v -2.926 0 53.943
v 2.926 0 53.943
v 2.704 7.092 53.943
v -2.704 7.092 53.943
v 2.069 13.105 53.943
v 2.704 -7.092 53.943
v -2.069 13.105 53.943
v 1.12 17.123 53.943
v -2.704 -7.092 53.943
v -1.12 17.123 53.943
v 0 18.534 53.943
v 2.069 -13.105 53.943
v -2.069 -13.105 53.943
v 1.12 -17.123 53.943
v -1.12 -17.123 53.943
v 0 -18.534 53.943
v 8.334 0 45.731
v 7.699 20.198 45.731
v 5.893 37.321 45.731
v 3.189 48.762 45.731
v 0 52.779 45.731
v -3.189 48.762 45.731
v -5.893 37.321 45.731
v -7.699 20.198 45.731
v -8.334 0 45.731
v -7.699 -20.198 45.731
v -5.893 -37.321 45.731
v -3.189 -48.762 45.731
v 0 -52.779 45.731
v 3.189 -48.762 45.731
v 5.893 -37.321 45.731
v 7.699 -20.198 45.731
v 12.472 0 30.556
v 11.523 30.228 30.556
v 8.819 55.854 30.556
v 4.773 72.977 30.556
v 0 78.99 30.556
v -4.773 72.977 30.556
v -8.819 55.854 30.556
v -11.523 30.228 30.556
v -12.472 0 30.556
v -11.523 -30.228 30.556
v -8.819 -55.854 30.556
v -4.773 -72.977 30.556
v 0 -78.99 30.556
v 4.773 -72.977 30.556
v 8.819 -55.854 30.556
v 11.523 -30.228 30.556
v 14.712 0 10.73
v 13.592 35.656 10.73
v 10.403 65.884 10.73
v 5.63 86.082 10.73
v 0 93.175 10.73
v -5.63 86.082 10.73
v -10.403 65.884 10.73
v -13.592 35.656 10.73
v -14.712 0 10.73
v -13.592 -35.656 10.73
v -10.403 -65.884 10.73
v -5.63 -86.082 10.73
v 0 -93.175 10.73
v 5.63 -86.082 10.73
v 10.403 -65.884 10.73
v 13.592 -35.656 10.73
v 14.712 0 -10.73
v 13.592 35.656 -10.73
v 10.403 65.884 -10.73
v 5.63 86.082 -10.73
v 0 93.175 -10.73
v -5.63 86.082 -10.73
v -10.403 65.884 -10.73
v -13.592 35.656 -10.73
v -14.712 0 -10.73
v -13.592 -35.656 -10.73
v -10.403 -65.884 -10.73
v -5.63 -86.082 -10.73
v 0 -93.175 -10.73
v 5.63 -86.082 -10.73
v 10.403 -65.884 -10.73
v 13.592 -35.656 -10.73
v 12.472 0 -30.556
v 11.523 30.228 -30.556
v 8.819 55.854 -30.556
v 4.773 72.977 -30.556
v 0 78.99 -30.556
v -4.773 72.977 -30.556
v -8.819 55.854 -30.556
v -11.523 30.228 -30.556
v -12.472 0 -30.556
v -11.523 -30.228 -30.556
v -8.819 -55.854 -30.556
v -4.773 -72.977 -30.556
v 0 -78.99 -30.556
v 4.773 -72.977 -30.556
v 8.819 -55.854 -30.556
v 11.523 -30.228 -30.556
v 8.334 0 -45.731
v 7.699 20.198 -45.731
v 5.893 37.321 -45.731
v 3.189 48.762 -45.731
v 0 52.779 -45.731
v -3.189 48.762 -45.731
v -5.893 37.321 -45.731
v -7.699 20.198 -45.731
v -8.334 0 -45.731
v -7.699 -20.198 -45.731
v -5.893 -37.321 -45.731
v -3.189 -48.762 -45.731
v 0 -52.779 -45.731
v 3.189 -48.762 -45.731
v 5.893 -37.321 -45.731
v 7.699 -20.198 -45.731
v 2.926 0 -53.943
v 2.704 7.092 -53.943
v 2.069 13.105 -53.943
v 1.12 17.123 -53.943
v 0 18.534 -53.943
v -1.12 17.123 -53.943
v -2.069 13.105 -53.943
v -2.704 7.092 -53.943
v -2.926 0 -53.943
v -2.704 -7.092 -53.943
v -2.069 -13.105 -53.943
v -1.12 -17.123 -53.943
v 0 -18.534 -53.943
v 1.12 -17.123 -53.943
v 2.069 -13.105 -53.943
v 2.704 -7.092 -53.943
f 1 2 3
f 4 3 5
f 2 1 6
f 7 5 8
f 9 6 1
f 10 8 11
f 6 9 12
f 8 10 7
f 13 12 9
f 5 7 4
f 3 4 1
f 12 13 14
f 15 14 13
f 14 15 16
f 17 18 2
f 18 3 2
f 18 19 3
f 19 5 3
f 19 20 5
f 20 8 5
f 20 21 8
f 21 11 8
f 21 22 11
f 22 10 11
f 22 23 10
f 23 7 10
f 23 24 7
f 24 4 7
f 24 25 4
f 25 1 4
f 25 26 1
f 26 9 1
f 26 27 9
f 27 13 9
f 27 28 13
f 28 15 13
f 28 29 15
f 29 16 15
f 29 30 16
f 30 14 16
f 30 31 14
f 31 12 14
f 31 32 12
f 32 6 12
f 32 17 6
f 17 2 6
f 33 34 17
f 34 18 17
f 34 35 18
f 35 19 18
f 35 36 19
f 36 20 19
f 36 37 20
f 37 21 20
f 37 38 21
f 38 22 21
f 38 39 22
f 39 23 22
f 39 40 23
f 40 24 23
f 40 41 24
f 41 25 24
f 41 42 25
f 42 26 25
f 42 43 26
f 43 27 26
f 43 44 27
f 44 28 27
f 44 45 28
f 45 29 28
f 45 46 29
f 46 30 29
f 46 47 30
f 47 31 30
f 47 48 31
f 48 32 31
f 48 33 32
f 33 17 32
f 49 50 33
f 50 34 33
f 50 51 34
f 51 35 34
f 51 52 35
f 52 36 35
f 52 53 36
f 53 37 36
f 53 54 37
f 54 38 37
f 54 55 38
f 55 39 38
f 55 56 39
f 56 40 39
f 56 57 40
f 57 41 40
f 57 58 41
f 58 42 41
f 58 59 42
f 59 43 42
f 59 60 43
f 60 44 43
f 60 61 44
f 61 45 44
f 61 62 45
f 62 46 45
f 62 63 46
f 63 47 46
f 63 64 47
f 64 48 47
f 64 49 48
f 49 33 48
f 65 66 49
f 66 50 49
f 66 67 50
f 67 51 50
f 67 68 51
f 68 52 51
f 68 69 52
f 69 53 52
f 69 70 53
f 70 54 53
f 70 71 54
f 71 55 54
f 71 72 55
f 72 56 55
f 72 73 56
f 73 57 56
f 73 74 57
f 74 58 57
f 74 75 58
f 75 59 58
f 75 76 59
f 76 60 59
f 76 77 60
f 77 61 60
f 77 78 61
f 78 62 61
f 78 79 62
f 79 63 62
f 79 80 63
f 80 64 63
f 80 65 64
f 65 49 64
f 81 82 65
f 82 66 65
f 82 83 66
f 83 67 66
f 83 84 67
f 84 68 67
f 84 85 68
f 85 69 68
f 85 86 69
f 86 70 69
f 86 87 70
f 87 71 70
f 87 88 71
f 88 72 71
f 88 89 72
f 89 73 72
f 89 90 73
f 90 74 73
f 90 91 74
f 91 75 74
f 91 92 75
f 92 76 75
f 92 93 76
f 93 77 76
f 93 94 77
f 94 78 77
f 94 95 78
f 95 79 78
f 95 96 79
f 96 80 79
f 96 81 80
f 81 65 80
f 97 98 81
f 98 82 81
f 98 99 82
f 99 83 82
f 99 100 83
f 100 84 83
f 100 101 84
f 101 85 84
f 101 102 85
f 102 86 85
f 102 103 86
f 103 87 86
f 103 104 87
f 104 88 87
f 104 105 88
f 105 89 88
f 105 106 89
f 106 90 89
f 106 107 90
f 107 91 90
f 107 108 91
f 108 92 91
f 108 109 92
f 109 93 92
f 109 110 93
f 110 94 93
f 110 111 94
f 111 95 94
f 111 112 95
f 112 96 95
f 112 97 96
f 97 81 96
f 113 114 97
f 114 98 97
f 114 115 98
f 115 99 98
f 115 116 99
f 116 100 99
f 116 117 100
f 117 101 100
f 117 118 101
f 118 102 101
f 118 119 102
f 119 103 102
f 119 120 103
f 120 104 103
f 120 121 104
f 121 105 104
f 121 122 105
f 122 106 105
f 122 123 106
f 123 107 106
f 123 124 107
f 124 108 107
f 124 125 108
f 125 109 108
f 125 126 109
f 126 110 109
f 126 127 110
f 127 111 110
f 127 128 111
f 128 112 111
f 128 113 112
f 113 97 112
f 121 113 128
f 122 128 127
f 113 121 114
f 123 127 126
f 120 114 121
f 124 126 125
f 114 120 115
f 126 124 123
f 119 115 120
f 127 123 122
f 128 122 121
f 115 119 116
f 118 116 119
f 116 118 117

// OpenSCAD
// Generated by SolidPython 1.0.1 on 2020-07-29 00:46:46


scale(v = [3, 19, 11]) {
	sphere(r = 5);
}
/***********************************************
*********      SolidPython code:      **********
************************************************
 
# import packages: SolidPython
from solid import *
from solid.utils import *
from itertools import chain, combinations, permutations


class Resize:

    def __init__(self, scad_file):
        self.scad_file = scad_file
        #self.scad_file = import_scad(scad_file)
        # cone/cylinder param:
        self.r1 = 0
        self.r2 = 0
        self.h = 0
        # rectangular prism param:
        self.w = 0
        self.l = 0
        # ellipse param:
        self.r = 0

    # import OpenScad code (file name corresponds to shape)


    # classify shape + parameters
    def assign(self, param1, param2, param3):
        if self.scad_file == 'cone.scad':
            self.r1 = param1
            self.r2 = param2
            self.h = param3
        elif self.scad_file == 'cylinder.scad':
            self.r1 = param1
            self.r2 = param2
            self.h = param3
        elif self.scad_file == 'rectangularPrism.scad':
            self.h = param1
            self.l = param2
            self.w = param3
        else:
            self.r = param1
            self.h = param2

    # resize parameters
    def iterate(self):
        x = range(3, 20, 2)
        i = 1
        if self.scad_file == 'cone.scad':
            tempList = list(permutations(x, 2))
            for temp in tempList:
                param1 = temp[0]
                param2 = temp[1]
                filepath = 'produced_scad_files/' + 'cone' + str(param1) + '_' + str(param2) + '_' + '.scad'
                scad_render_to_file(cylinder(h=param1, r1=param2, r2=0), filepath)

        elif self.scad_file == 'cylinder.scad':
            tempList = list(permutations(x, 3))
            for temp in tempList:
                param1 = temp[0]
                param2 = temp[1]
                filepath = 'produced_scad_files/' + 'cylinder' + str(param1) + '_' + str(param2) + '_' + '.scad'
                scad_render_to_file(cylinder(h=param1, r1=param2, r2=param2), filepath)

        elif self.scad_file == 'rectangularPrism.scad':
            tempList = list(permutations(x, 3))
            for temp in tempList:
                param1 = temp[0]
                param2 = temp[1]
                param3 = temp[2]
                filepath = 'produced_scad_files/' + 'rectangularPrism' + str(param1) + '_' + str(param2) + '_' + str(
                    param3) + '.scad'
                scad_render_to_file(cube(size=(param1, param2, param3)), filepath)

        elif self.scad_file == 'ellipse.scad':
            tempList = list(permutations(x, 4))
            for temp in tempList:
                param1 = temp[0]
                param2 = temp[1]
                param3 = temp[2]
                param4 = temp[3]
                filepath = 'produced_scad_files/' + 'ellipse' + str(param1) + '_' + str(param2) + '_' + str(param3) + '_' + str(param4) + '.scad'
                scad_render_to_file(scale([param1, param2, param3])(sphere(r=param4)), filepath)

    def render_to_scadfile(self):
        scad_render_to_file(scad, 'example.scad') 
 
************************************************/
